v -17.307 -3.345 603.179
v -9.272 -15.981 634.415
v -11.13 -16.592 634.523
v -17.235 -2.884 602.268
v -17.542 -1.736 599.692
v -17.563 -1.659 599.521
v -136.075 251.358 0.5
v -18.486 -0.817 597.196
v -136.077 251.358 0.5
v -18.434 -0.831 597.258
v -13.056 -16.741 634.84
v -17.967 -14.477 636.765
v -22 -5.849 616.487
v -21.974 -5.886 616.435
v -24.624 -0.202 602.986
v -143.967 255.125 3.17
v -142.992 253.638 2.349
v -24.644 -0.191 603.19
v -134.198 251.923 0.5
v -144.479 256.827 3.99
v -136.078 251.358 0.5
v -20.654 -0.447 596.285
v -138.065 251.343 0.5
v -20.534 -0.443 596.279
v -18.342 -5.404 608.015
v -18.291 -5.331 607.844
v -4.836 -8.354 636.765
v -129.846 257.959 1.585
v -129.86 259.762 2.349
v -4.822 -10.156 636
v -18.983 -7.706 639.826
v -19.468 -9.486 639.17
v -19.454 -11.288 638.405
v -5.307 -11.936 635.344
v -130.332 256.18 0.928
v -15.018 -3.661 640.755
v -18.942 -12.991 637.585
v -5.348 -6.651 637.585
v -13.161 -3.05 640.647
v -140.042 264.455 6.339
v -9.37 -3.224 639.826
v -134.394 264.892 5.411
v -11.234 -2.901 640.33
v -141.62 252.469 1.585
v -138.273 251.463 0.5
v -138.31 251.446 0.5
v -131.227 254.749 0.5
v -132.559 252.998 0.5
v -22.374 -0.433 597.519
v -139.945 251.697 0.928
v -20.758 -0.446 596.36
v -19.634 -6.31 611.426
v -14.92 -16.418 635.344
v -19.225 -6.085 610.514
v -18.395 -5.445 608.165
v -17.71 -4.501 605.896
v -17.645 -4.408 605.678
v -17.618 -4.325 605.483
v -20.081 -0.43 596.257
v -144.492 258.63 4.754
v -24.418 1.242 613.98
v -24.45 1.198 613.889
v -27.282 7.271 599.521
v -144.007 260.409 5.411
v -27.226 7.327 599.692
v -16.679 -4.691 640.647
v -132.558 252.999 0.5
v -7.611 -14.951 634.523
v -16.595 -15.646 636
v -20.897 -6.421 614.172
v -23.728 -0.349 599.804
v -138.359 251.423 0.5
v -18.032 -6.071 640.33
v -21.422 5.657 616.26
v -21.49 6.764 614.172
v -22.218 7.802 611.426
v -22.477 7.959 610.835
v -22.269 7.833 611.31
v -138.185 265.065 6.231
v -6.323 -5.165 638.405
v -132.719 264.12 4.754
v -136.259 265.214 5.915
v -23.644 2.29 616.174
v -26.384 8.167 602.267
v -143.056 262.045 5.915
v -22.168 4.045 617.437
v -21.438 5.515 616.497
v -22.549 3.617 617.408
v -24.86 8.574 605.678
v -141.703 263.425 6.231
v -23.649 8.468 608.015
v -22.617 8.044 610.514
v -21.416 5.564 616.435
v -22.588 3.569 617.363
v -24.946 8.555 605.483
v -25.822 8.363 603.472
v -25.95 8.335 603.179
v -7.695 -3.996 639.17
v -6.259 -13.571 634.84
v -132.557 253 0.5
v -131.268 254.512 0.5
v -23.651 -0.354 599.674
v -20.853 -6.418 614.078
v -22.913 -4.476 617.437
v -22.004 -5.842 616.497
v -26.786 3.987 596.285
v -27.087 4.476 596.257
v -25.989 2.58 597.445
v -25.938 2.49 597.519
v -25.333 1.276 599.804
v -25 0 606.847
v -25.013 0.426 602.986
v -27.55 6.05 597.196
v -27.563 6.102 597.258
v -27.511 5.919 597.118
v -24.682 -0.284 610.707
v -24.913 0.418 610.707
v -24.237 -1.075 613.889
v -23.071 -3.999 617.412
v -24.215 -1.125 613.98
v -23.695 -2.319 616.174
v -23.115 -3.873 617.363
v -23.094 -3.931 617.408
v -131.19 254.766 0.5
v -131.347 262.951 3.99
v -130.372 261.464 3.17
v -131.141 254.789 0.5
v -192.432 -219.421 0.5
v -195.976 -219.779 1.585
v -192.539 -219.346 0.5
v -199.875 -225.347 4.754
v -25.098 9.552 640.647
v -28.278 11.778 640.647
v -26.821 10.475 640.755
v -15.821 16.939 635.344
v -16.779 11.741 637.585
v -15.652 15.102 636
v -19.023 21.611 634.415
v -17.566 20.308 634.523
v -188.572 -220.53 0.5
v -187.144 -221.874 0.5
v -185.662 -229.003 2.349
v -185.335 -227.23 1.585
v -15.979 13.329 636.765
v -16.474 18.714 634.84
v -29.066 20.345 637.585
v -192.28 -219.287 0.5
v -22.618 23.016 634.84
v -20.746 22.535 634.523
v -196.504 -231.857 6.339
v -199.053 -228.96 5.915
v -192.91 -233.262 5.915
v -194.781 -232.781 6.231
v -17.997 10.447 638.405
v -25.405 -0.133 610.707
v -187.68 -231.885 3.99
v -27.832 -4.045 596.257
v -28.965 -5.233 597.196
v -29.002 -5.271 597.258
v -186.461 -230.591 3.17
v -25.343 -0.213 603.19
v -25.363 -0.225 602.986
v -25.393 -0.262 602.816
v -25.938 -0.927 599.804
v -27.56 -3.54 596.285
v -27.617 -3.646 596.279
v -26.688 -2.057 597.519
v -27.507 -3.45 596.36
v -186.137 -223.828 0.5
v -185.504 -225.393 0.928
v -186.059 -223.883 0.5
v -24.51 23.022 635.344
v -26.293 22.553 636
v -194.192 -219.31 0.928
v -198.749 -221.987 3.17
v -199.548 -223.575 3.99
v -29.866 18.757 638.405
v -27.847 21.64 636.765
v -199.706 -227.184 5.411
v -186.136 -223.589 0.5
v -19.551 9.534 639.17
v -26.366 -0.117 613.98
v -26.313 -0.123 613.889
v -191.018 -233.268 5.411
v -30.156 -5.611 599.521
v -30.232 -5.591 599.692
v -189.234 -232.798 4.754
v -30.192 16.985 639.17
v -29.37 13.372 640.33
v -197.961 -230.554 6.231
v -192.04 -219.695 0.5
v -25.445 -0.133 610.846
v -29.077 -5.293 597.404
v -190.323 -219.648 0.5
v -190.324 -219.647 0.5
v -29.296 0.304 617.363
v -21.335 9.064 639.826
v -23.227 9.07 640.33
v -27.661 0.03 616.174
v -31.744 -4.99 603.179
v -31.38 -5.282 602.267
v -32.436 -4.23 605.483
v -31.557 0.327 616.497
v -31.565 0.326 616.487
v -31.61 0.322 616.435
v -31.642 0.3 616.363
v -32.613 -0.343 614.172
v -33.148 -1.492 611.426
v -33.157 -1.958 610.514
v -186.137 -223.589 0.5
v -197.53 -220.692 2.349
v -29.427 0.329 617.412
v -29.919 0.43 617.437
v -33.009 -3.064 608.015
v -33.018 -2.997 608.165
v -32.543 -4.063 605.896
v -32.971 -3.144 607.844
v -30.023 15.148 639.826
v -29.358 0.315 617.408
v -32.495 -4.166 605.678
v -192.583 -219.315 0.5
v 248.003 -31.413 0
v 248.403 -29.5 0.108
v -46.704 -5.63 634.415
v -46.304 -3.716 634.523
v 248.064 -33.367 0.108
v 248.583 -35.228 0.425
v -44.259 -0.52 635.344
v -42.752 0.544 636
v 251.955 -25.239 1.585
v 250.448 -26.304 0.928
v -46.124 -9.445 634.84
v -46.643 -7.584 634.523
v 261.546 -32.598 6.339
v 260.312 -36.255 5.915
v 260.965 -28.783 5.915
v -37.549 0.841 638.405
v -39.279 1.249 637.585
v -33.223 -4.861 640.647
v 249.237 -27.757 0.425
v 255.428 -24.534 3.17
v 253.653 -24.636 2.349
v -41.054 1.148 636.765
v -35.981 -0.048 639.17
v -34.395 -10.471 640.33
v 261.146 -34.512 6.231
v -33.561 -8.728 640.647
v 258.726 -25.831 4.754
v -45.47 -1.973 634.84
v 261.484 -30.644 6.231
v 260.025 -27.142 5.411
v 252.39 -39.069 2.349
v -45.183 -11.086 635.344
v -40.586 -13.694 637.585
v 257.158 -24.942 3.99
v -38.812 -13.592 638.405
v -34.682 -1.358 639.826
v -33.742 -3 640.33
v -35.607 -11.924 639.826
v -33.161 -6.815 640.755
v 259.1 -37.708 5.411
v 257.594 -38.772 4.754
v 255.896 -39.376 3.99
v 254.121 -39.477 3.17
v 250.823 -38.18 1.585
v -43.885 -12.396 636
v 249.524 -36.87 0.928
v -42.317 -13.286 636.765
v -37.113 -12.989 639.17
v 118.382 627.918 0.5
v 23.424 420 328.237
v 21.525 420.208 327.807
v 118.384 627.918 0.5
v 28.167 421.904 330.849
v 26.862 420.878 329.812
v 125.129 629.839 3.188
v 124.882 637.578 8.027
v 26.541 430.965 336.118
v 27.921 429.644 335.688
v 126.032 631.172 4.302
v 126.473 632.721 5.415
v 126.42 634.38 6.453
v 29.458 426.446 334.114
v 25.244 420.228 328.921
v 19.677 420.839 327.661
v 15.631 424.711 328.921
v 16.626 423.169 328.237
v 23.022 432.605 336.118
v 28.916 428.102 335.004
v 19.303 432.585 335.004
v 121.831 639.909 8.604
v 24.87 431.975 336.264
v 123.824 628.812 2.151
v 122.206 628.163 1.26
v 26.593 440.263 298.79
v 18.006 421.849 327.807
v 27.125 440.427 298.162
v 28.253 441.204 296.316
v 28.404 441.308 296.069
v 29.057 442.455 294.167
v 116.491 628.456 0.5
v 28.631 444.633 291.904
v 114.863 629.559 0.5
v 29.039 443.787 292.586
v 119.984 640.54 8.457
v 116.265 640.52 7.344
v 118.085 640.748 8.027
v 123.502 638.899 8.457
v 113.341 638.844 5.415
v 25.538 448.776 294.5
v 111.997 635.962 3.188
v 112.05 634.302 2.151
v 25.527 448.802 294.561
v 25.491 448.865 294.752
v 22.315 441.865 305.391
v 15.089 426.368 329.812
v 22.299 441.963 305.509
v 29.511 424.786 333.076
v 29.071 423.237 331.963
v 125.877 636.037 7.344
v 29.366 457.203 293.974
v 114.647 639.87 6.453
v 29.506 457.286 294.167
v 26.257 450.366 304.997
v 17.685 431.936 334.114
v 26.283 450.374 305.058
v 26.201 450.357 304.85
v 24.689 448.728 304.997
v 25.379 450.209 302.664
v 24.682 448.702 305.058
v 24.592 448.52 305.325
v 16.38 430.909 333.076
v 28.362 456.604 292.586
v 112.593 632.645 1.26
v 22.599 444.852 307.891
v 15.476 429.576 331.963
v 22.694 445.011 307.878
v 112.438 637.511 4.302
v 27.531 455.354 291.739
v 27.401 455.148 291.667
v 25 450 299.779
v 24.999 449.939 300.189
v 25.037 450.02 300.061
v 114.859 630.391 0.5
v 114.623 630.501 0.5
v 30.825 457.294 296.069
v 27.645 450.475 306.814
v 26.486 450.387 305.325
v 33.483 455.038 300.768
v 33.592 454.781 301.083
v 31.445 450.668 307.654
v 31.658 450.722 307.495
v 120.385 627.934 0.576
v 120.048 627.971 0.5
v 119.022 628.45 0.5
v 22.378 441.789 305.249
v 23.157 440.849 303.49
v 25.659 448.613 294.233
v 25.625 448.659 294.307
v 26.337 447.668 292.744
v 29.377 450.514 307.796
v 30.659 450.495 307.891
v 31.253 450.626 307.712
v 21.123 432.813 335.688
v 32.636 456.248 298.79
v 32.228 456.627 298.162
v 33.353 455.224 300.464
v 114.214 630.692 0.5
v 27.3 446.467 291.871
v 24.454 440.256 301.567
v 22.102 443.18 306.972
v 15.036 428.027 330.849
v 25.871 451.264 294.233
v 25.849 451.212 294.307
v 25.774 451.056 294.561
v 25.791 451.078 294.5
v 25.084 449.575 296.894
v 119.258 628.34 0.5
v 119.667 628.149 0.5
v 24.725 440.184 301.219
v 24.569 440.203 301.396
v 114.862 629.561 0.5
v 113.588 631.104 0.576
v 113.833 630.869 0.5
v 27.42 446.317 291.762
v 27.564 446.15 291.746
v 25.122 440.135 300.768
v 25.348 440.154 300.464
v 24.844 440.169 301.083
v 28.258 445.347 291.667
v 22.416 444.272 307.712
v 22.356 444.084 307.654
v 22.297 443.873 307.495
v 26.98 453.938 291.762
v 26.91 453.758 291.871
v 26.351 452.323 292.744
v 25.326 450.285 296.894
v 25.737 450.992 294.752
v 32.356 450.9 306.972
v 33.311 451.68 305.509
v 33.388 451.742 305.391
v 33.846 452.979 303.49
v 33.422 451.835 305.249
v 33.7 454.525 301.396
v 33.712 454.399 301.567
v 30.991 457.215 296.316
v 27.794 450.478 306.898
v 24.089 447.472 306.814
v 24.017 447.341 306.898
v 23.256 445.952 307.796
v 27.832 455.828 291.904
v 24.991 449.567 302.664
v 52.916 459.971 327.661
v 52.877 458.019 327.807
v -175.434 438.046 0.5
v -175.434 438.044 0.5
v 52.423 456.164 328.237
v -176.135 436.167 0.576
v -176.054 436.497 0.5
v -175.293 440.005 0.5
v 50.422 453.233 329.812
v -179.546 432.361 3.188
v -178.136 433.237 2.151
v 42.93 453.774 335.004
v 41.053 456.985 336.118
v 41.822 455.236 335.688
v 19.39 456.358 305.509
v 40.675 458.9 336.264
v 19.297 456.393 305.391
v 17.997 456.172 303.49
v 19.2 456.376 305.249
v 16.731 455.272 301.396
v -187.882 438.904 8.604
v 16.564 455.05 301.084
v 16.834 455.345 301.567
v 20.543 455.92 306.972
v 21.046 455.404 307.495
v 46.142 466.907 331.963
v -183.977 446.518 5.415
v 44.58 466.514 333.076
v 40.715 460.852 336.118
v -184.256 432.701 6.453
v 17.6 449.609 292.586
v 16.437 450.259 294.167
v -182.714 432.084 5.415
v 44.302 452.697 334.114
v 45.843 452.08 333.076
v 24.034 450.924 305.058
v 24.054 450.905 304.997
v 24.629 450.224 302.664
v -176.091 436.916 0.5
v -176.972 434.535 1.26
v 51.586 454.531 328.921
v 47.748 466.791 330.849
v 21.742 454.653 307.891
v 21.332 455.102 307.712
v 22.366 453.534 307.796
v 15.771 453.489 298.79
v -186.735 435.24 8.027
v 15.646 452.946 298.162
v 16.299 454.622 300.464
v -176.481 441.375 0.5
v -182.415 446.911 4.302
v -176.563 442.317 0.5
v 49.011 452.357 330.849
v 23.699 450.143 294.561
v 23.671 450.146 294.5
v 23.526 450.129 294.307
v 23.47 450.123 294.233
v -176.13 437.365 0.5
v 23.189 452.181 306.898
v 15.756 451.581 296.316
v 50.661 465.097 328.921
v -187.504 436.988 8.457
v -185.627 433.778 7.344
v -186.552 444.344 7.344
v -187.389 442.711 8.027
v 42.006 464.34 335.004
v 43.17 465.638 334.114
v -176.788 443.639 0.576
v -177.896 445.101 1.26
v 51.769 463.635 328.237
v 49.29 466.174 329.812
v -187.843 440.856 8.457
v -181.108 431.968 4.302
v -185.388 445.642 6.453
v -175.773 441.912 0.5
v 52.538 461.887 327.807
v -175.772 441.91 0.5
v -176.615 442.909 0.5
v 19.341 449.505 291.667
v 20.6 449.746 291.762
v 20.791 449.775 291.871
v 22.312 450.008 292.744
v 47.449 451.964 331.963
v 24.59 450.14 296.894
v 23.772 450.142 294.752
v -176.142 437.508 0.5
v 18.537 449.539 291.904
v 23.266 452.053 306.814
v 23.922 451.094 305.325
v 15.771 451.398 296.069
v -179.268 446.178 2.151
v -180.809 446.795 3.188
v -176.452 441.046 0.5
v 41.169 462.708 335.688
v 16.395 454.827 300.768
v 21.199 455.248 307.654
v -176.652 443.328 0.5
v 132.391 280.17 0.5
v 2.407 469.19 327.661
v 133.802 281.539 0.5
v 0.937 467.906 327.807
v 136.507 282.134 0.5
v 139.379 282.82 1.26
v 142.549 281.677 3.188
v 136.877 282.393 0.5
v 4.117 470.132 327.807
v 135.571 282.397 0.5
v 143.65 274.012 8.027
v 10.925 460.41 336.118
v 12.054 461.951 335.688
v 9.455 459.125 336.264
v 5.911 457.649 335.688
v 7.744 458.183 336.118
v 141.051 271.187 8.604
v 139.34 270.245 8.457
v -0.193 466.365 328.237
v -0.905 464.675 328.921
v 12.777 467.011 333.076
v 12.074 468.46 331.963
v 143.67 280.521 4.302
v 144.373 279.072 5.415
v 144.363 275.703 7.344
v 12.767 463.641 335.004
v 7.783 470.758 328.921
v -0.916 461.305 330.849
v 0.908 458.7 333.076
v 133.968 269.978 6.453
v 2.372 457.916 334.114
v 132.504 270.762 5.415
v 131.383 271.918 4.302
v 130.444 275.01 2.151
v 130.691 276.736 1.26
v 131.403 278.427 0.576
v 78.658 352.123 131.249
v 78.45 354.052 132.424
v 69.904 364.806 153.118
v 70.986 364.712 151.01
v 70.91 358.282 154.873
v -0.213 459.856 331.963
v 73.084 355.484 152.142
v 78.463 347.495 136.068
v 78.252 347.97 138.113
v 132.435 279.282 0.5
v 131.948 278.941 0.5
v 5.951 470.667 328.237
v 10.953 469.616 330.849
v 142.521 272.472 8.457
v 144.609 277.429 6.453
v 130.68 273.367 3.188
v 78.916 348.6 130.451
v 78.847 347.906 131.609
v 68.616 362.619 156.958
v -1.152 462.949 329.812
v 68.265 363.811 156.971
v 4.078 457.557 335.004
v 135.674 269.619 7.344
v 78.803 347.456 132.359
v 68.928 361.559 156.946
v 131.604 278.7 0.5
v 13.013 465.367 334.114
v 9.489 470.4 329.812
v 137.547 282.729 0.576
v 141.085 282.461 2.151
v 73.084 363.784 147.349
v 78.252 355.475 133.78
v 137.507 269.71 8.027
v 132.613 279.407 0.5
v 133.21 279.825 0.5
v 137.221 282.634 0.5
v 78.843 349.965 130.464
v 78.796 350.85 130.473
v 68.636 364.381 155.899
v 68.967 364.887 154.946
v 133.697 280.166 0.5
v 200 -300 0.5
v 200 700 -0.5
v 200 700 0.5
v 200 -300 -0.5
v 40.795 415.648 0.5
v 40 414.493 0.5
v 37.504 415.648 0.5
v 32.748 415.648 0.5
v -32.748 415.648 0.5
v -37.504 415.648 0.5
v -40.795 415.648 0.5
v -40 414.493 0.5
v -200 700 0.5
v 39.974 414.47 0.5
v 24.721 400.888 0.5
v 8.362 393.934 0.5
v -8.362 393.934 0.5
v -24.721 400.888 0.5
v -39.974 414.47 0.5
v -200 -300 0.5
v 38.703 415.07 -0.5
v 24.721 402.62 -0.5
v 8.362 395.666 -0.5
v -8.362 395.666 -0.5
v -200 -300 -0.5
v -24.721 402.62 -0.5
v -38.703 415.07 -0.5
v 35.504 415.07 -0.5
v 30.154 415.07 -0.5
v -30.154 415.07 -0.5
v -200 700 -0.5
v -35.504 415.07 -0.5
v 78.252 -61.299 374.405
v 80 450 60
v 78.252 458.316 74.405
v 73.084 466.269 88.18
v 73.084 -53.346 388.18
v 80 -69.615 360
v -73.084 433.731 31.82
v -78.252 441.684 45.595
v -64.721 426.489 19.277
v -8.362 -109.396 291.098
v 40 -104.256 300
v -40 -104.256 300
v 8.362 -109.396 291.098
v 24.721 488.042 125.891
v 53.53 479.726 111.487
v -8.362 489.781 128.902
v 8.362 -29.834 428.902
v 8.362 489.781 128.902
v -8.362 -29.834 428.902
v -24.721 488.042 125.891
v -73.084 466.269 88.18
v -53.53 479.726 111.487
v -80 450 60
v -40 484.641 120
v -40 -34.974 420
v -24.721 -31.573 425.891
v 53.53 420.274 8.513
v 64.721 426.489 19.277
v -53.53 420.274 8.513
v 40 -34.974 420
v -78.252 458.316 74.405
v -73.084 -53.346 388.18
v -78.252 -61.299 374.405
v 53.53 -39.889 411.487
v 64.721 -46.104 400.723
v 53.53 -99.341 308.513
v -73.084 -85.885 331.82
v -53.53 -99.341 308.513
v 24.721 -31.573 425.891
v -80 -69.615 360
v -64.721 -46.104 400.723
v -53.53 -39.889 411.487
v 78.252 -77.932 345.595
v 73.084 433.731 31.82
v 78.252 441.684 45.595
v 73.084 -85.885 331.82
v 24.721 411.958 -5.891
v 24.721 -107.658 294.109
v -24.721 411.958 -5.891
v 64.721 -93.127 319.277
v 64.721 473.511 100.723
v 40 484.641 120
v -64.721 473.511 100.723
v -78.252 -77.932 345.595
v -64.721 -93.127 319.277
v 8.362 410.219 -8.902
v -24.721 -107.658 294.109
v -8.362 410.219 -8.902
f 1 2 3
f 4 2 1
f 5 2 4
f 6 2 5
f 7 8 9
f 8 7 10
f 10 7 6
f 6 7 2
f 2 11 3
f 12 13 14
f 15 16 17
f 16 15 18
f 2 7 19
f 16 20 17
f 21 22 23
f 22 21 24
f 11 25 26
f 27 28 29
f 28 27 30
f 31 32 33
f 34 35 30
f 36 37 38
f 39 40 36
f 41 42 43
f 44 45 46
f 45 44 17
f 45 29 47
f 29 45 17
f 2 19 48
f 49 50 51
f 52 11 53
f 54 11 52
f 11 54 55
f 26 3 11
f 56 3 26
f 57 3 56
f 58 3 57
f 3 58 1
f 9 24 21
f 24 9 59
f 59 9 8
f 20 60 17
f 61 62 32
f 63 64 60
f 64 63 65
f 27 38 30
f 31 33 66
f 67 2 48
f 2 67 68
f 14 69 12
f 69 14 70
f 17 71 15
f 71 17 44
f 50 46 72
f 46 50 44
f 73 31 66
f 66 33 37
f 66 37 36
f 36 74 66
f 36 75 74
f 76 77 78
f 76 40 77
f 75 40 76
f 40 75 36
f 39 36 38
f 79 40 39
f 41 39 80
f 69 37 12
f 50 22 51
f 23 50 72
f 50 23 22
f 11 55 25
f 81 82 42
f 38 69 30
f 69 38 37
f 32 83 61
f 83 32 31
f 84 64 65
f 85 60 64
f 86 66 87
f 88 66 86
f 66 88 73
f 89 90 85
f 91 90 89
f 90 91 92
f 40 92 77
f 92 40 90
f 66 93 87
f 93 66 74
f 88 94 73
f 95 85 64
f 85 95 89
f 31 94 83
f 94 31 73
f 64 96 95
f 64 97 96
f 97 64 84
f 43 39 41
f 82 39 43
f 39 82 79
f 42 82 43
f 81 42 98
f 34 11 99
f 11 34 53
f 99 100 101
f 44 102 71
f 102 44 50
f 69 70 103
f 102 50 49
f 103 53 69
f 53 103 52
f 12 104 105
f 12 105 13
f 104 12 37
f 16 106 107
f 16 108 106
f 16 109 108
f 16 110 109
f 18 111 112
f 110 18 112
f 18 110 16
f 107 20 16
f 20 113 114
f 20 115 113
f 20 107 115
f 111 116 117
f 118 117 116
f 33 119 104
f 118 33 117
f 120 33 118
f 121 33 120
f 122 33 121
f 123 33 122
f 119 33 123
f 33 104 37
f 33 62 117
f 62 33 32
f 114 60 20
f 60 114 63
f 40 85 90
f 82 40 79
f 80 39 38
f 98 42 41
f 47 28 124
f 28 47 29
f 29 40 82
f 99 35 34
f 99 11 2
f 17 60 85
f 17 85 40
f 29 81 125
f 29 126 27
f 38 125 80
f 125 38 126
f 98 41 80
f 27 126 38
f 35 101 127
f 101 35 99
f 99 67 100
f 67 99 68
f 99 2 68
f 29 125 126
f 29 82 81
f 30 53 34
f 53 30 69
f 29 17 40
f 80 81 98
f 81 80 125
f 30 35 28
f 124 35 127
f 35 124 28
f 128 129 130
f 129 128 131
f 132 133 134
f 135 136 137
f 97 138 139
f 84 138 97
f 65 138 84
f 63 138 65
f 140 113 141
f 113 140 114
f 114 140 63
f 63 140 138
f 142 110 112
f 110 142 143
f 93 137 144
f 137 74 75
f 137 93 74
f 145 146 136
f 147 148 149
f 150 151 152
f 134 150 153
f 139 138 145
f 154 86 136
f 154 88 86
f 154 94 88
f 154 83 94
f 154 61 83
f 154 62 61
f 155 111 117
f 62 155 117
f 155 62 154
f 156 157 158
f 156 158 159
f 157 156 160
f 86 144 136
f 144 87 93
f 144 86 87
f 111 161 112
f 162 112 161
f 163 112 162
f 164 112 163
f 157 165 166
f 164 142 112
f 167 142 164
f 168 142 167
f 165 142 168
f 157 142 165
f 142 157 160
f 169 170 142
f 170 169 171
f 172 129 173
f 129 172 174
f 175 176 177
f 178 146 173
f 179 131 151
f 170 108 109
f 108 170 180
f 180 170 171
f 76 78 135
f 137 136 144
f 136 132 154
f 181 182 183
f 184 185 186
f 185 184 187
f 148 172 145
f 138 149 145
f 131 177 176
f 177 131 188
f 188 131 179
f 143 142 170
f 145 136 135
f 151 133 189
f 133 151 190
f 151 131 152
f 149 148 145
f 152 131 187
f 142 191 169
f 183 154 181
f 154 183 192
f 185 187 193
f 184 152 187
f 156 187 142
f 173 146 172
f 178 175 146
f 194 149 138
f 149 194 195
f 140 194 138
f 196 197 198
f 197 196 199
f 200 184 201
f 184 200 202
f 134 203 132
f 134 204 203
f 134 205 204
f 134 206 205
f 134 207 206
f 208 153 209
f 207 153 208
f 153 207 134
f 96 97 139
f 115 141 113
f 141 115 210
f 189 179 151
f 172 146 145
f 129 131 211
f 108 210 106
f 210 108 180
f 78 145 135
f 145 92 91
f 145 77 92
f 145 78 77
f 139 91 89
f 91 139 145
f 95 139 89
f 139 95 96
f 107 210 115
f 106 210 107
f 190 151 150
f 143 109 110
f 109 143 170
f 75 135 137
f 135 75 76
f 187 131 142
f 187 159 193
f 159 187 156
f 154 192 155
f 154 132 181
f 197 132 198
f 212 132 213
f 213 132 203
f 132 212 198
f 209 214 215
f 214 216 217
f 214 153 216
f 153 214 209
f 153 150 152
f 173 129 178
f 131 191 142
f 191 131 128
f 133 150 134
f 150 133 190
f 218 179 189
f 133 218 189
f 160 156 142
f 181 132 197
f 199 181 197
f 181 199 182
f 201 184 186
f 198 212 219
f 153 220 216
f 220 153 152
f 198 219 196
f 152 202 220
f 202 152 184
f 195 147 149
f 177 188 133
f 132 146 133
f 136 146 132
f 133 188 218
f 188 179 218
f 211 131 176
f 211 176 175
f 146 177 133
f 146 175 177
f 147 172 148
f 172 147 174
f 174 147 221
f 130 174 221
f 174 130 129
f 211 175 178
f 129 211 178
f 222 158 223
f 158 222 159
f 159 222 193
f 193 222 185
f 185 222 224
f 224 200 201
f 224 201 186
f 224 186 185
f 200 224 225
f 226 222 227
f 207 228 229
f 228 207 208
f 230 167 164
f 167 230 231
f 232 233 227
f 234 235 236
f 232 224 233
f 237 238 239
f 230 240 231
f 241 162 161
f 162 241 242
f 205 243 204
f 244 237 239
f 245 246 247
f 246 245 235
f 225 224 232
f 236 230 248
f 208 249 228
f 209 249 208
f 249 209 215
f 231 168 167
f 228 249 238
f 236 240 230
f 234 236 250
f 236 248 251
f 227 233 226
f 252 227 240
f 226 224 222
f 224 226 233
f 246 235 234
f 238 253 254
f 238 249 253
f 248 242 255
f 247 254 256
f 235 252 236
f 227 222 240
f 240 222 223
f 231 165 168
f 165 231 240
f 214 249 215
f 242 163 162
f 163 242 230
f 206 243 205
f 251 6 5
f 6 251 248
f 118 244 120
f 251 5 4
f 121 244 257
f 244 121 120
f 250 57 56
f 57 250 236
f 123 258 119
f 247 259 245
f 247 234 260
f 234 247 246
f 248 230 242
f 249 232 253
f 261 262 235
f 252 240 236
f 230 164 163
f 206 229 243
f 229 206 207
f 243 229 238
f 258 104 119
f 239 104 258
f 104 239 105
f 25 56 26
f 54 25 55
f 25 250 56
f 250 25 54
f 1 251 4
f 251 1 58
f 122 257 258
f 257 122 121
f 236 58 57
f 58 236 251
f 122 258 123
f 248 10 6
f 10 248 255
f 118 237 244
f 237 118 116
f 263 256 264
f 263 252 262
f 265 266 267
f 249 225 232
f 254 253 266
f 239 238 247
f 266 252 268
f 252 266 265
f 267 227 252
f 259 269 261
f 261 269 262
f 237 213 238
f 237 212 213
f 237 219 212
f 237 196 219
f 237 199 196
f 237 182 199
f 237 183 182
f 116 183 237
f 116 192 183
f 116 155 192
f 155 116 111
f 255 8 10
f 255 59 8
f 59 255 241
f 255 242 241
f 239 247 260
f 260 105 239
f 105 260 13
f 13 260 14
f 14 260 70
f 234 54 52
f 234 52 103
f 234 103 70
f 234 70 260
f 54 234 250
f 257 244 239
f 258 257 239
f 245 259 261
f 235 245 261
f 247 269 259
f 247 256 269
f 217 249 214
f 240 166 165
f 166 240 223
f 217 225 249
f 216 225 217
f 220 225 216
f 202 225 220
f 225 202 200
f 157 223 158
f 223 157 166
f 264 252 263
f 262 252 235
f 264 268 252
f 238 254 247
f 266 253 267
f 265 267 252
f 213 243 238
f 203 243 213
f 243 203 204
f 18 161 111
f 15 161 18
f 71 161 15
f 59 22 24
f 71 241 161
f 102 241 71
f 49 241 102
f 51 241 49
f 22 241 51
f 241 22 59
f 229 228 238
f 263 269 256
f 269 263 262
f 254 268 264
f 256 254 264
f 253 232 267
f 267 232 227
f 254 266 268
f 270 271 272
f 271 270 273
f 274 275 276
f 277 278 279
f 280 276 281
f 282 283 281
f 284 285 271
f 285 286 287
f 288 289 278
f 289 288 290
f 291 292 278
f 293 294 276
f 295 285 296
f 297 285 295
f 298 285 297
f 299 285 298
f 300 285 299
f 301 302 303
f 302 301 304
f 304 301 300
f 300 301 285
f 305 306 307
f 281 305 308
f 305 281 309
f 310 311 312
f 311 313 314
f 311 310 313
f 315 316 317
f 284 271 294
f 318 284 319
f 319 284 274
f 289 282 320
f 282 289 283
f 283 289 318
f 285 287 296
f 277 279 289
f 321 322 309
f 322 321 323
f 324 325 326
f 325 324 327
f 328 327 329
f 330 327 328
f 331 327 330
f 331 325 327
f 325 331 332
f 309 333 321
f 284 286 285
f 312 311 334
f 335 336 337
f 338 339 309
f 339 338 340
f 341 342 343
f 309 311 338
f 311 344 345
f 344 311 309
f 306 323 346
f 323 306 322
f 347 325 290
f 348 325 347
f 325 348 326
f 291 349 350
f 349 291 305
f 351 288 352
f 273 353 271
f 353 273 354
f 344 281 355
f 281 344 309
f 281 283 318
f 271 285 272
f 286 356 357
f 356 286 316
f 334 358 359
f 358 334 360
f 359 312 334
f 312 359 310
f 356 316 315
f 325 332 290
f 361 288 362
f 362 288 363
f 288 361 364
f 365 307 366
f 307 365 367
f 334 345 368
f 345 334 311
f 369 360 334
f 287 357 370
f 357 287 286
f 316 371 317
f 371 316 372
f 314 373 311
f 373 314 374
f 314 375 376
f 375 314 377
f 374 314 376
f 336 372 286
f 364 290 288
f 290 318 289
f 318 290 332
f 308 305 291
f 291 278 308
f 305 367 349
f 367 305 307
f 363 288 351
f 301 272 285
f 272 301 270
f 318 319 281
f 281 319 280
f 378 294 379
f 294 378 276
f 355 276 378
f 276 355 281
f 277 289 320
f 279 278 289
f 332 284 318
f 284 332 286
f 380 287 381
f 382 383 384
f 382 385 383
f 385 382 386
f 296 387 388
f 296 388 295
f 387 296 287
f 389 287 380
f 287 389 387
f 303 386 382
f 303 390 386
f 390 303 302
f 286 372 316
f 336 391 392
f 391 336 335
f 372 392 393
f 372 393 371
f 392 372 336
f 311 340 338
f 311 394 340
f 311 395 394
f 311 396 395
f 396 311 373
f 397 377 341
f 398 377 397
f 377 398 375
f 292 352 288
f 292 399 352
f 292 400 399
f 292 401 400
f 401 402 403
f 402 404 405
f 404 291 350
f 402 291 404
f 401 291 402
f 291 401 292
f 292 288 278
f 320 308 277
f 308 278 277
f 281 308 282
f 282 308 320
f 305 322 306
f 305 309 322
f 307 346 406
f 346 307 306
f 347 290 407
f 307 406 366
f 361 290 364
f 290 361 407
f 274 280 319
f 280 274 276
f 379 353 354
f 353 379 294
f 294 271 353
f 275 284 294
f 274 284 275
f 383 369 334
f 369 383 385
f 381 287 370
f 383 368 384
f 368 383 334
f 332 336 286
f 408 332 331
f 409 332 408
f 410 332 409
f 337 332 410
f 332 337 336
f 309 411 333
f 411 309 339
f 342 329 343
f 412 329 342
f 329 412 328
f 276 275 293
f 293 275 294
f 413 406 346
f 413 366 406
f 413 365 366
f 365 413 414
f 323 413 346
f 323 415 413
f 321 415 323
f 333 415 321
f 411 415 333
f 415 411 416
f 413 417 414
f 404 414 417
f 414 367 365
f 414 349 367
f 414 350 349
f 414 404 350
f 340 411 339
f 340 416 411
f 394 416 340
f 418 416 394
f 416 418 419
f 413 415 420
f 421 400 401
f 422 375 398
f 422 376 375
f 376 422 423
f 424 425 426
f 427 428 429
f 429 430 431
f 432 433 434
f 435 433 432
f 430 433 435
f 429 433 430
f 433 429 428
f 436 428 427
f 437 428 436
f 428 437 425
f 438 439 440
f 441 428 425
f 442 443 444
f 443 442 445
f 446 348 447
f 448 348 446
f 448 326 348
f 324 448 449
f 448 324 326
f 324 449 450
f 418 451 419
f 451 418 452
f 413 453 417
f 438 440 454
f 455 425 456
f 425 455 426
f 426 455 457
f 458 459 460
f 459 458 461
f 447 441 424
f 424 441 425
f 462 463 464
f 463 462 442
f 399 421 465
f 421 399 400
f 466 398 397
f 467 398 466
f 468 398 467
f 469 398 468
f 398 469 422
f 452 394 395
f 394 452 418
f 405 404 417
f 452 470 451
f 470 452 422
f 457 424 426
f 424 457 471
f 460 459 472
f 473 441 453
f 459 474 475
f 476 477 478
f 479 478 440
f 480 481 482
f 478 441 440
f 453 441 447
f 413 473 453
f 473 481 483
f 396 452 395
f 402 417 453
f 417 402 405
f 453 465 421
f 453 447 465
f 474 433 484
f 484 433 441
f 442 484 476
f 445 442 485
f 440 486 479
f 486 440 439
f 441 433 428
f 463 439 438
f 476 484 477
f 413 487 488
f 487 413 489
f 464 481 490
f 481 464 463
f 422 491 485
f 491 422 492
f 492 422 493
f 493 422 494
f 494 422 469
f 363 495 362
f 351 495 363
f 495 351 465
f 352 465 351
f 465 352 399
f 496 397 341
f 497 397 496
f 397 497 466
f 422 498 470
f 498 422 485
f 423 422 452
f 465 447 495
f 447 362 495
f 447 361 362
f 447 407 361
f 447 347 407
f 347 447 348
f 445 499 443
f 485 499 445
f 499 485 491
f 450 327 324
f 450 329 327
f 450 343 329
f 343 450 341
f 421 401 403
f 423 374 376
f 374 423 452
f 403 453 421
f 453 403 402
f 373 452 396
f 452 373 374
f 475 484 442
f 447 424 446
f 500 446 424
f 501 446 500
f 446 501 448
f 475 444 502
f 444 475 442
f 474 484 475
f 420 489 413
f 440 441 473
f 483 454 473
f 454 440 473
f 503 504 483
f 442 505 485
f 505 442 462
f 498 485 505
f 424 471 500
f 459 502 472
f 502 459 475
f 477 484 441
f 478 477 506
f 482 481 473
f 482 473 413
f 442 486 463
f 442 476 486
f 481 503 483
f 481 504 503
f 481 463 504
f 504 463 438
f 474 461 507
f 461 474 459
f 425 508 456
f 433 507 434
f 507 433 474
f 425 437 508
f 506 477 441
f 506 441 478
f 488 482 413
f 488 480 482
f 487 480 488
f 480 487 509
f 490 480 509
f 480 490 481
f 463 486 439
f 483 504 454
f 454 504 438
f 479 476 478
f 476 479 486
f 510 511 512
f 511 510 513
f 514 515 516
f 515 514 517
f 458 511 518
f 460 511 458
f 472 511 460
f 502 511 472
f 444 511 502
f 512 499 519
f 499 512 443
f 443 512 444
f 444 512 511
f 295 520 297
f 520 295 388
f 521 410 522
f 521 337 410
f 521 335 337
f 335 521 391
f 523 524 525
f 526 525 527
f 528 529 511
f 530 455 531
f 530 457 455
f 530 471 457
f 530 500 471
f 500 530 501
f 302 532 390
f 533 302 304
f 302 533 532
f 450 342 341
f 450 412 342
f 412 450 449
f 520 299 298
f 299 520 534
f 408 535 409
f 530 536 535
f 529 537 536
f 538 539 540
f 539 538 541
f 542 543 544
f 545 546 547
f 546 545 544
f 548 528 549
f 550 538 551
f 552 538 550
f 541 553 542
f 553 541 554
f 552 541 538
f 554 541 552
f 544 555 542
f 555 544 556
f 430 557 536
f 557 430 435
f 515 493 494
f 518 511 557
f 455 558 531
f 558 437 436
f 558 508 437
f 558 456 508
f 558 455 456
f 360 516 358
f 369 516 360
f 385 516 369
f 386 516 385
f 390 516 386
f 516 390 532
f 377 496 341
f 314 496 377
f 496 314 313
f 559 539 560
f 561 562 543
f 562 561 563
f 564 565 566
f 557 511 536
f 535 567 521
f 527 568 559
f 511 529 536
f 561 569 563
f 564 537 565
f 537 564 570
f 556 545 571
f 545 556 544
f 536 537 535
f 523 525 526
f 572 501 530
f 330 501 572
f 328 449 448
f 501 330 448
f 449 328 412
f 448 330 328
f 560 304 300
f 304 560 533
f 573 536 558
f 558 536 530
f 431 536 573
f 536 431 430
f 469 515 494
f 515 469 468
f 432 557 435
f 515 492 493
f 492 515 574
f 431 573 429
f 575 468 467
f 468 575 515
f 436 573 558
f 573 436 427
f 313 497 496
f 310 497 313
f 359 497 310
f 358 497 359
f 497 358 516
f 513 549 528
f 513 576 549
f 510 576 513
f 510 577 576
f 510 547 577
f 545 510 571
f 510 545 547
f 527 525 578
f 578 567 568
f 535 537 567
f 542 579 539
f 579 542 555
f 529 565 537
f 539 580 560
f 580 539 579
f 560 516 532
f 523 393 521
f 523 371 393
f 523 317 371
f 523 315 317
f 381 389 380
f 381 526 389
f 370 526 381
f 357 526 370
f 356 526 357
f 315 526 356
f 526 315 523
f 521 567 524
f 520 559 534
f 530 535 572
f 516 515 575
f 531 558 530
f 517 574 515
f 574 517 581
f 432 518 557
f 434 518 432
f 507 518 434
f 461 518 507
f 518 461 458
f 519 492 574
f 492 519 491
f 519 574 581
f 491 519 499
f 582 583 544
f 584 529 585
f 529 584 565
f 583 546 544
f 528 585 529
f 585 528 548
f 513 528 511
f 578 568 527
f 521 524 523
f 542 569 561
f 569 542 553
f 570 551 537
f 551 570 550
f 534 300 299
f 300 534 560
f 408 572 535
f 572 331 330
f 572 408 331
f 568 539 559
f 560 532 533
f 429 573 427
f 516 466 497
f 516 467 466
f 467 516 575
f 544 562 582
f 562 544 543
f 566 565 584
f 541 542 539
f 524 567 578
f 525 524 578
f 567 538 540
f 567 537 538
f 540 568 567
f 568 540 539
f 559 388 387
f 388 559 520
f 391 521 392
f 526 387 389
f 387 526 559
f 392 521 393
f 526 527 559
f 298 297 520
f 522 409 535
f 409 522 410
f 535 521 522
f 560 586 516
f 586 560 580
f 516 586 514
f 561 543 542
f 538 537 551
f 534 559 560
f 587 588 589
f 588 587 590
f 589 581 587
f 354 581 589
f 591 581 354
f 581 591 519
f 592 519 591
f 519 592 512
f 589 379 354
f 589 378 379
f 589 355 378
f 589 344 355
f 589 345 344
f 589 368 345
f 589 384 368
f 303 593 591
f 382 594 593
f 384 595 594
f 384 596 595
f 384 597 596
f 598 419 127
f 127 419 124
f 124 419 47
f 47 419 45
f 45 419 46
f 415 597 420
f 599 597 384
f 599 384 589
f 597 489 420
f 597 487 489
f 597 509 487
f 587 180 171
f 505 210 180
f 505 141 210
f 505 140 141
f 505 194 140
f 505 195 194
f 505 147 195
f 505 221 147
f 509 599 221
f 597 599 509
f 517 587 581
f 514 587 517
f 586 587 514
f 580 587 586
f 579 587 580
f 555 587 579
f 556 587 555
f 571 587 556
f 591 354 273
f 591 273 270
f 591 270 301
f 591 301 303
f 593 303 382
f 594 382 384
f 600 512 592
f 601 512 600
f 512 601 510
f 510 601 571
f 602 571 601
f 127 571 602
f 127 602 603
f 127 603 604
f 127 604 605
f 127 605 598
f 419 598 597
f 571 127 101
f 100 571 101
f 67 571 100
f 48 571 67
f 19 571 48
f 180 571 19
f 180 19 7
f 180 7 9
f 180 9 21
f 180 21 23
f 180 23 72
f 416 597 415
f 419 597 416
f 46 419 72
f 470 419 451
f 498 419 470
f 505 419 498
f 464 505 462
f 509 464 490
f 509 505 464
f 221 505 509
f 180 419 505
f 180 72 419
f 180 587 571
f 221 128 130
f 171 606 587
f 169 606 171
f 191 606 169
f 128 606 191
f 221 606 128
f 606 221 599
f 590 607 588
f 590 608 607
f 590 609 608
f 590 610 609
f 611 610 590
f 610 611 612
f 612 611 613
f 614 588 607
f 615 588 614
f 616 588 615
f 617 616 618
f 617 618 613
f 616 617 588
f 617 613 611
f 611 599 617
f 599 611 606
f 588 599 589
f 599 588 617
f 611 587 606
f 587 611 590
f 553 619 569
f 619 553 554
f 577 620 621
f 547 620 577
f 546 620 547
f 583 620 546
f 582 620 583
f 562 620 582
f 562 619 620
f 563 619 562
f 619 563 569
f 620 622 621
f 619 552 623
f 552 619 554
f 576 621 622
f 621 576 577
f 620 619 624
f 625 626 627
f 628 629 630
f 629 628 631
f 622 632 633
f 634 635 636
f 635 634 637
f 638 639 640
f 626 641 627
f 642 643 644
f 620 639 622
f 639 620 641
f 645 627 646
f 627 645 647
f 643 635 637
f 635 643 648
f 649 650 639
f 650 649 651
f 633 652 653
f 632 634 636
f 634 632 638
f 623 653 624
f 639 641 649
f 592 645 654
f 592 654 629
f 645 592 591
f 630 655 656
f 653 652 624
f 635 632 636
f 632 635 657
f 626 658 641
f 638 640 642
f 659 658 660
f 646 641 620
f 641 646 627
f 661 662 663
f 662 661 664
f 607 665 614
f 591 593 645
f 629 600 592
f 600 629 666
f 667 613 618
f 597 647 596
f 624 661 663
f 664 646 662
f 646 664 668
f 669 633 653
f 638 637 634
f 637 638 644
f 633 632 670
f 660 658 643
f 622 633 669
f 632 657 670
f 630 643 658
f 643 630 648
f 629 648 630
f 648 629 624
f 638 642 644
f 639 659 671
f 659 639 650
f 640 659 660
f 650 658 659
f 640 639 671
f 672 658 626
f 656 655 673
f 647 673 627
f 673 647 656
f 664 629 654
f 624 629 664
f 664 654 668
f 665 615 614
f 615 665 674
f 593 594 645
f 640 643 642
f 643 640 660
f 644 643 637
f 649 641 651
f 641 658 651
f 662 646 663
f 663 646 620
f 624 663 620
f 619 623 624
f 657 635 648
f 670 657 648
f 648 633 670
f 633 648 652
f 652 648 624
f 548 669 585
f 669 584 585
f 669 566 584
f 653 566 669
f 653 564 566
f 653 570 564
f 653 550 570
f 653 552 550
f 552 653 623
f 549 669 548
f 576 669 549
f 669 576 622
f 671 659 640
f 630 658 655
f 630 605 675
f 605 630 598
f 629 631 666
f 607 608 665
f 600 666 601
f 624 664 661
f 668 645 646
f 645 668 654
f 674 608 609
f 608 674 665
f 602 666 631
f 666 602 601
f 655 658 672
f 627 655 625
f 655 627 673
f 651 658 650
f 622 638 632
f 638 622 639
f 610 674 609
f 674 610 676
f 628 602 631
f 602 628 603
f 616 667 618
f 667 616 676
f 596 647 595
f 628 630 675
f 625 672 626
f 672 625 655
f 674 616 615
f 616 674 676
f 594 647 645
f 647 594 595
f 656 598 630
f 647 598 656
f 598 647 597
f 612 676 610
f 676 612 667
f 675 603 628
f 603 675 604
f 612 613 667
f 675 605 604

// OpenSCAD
// file: fanta.scad
// Johan Govers 2015
// OpenSCAD version 2014.03 


pd = 15; // paal diameter

module paal(l, center) {
  cylinder(h = l, r=pd / 2, center=center);
  echo("paal", l, "cm");
}


module ton() {
  color("blue")
  cylinder(h = 100, r=50, center=true);
  echo("ton 200l");  
}

module poot(p, length, hoek) {
  for (i = [0:360/p:360-(360/p)]) { 
    translate([0,0, sin(90-hoek) * (length - 50)]) 
    rotate([0, 180-hoek, i]) 
    translate([-pd/2,-pd/2,-50]) 
    paal(length, false);
  }
}

module driepoot(length, hoek) {
  poot(3, length, hoek);
}

module vierpoot(length, hoek) {
  poot(4, length, hoek);
}

// l=length, b=breet, m=maasgroote
module net(l, b, m) {
  for (i = [-b/2:m:b/2])
  translate([0,i, 0]) 
  rotate([0,90,0]) 
  cylinder(l, r=1, center=true);

  for (i = [-l/2:m:l/2])
  translate([i,0, 0]) 
  rotate([90,0,0]) 
  cylinder(b, r=1, center=true);
  echo ("net ", l, "x", b, " cm");
}

module autoband(inch_buiten = 28, inch_binnen = 20, h = 20) {
  color([0.5,0.5,0.5])
  rotate(a=90, v=[1,0,0]) 
  difference() {
    intersection() {
      sphere(r=inch_buiten*2.56/2, center=true);
      cylinder(h = h, r=inch_buiten*2.56/2,  center=true);
    }
    cylinder(h = 500, r=inch_binnen*2.56/2,  center=true);
  }
  echo("autoband");
}







// kussengevecht();
// ladder();
// autobandMuur();
// poort(500, 600);
// valnet();
// net(500,300,15);
// klimDrieHoek(500, 30);
// aframe();
// schoef();
// glijbaan();
// main file
include <fanta.scad>

// https://www.veiligheid.nl/allesoverspelen/eisen-speeltoestellen/glijbaan
module glijbaan() {
  color("green")
  translate([0, 200, 0])
  cube([400,1000,1], true);
  
    translate([-25, 0, 0])
  rotate(a=-65 + 180, v=[0,0,1]) 
  driepoot(700, 25);
  
  translate([25, 450, 0])
     rotate(a=65, v=[0,0,1]) 
  driepoot(400, 35);
  
  translate([0, 450, 60])
      rotate(a=60, v=[1,0,0]) 
  cylinder(h = 600, r=80, center=false);
}

glijbaan();
